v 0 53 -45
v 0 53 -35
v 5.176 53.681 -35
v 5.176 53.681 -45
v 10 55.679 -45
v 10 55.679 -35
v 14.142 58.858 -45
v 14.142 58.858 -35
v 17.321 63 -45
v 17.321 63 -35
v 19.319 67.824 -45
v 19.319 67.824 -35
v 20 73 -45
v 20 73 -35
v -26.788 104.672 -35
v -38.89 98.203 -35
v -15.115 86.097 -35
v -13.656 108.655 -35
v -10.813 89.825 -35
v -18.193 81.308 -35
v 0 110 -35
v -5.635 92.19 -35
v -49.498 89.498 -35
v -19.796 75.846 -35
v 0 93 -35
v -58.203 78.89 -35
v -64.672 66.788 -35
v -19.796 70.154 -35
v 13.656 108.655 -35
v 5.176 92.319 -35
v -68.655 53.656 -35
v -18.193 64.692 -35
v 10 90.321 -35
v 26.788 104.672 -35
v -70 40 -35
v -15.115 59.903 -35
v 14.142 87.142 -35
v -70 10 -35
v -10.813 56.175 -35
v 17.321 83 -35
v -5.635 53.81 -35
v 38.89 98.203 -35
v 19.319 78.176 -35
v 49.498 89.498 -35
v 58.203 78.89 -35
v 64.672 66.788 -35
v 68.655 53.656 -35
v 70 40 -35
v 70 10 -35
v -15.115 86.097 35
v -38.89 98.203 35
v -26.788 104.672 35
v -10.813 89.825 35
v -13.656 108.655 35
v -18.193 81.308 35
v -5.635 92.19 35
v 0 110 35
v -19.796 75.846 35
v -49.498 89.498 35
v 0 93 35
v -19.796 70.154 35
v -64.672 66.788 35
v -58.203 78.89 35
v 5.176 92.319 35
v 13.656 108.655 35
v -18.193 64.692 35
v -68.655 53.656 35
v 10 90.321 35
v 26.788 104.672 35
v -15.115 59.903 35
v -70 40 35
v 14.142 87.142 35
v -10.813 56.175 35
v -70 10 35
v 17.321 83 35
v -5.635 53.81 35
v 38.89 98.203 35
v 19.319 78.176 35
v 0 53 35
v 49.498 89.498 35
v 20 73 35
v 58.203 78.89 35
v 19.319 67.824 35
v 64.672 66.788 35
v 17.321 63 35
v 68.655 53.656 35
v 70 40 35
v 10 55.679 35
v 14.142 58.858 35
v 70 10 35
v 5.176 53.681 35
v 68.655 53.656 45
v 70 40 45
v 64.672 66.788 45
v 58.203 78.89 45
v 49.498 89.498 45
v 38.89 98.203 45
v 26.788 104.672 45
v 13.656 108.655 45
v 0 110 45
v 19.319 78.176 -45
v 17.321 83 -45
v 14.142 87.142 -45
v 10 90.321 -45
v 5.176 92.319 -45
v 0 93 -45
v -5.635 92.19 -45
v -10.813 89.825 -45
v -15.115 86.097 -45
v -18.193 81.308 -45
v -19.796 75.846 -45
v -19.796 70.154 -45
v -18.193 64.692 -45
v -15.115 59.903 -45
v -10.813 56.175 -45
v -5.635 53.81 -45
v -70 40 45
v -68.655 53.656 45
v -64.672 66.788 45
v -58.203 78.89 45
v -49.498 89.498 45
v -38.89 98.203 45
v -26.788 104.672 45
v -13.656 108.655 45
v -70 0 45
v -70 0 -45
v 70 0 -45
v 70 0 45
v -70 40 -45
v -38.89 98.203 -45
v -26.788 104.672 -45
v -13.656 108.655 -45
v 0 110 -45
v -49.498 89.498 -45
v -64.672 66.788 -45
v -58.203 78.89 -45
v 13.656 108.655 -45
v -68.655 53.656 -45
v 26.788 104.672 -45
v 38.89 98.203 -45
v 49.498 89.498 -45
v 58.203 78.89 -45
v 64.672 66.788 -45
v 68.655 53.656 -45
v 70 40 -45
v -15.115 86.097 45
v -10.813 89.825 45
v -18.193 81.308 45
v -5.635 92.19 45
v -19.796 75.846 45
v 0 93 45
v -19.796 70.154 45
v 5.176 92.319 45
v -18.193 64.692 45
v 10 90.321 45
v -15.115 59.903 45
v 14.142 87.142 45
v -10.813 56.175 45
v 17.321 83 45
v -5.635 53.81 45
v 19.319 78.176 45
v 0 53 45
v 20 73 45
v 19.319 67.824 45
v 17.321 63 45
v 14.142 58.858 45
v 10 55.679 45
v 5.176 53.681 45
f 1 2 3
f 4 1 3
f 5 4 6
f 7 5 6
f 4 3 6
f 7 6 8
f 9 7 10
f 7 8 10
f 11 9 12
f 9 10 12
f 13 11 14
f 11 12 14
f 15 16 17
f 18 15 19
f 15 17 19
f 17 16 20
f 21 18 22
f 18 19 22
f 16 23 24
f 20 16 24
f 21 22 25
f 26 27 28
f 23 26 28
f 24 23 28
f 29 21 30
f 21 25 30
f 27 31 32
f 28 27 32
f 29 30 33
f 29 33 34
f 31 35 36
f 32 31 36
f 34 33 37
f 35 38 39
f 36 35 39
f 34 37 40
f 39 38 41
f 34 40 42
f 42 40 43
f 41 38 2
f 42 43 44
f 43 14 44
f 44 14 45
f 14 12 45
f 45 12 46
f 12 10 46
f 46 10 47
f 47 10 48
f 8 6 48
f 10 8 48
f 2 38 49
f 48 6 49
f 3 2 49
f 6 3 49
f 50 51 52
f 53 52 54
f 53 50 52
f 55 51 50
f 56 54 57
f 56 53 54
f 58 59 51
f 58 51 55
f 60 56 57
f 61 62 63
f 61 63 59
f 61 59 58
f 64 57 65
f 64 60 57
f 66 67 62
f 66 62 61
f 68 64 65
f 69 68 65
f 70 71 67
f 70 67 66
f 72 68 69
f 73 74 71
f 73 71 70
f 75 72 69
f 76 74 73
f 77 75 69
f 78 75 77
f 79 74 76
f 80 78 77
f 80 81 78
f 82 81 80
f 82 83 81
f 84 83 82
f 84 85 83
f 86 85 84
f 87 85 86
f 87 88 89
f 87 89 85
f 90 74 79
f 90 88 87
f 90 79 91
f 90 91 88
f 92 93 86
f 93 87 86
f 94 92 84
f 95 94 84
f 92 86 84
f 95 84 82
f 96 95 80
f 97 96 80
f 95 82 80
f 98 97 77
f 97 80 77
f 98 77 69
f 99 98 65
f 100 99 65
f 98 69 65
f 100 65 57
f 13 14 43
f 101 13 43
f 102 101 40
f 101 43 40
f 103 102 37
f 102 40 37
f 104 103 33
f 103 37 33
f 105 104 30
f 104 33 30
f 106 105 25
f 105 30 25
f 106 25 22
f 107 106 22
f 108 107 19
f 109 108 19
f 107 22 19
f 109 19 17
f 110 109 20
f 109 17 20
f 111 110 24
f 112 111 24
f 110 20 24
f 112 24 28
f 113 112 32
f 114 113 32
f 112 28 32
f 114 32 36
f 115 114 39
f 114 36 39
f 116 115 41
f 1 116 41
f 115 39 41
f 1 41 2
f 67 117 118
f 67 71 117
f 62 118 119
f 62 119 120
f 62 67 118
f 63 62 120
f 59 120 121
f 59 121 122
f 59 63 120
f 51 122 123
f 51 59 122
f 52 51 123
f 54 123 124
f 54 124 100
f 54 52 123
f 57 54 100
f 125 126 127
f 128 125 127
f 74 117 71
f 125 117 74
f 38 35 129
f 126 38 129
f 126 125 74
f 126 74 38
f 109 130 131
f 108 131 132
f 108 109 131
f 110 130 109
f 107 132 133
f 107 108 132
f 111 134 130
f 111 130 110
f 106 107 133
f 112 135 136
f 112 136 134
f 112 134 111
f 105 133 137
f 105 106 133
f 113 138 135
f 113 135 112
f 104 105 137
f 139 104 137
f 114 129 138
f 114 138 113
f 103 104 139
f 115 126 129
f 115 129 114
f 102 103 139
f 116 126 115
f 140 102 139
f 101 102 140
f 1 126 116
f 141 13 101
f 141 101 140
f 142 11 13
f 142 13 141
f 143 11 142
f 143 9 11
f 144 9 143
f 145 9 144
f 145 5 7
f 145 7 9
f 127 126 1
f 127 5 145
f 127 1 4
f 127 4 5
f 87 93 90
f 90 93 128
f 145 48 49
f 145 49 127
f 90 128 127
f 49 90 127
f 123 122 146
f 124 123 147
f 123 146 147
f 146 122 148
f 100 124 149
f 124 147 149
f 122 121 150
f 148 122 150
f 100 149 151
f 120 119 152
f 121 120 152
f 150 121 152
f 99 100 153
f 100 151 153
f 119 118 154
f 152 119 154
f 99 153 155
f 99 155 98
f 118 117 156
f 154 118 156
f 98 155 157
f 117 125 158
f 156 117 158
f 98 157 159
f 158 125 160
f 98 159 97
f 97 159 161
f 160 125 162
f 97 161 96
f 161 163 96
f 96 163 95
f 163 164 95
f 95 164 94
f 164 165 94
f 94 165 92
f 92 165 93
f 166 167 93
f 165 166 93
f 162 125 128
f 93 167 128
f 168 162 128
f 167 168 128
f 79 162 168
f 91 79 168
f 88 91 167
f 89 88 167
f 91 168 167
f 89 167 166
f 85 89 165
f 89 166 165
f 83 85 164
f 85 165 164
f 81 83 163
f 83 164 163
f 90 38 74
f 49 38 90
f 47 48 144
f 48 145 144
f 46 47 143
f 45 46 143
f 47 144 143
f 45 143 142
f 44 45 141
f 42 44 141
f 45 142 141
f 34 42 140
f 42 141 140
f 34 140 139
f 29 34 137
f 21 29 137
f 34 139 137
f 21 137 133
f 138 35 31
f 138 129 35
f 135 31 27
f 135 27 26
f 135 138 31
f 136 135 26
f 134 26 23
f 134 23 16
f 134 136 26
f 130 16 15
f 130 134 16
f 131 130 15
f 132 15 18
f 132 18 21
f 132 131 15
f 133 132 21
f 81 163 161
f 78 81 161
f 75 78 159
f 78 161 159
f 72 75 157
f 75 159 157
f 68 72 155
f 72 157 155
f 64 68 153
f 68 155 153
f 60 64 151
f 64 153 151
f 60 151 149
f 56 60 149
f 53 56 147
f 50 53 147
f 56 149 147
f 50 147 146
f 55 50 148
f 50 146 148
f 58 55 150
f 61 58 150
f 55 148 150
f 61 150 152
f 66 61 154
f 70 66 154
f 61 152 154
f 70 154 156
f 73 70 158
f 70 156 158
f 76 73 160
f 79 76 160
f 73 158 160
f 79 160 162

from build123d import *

# Parameters (mm, degrees)
CROQUIS1_W              = 140
CROQUIS1_H              = 90
SALIENTE_EXTRUIR1_DEPTH = 10
CROQUIS2_W              = 140
CROQUIS2_H              = 10
SALIENTE_EXTRUIR2_DEPTH = 100
REDONDEO1_R             = 70
CORTAR_EXTRUIR1_DEPTH   = 100


with BuildPart() as part:
    # Croquis1 → Saliente-Extruir1 (new body)
    with BuildSketch(Plane(origin=(0, 0, 0), x_dir=(1, 0, 0), z_dir=(0, 1, 0))):
        Rectangle(CROQUIS1_W, CROQUIS1_H)
    extrude(amount=SALIENTE_EXTRUIR1_DEPTH)

    # Croquis2 → Saliente-Extruir2 (add)
    with BuildSketch(Plane(origin=(0, 10, 0), x_dir=(1, 0, 0), z_dir=(0, 1, 0))):
        with Locations((0, -40)):
            Rectangle(CROQUIS2_W, CROQUIS2_H)
        with Locations((0, 40)):
            Rectangle(CROQUIS2_W, CROQUIS2_H)
    extrude(amount=SALIENTE_EXTRUIR2_DEPTH)

    # Redondeo1
    redondeo1_edges = [part.edges().sort_by_distance(p)[0] for p in [
        (-70, 110, 40),
        (70, 110, 40),
        (70, 110, -40),
        (-70, 110, -40),
    ]]
    fillet(redondeo1_edges, radius=REDONDEO1_R - 0.0001)  # a hair under: the kernel refuses the full size

    # Croquis3 → Cortar-Extruir1 (cut)
    with BuildSketch(Plane.XY.offset(45)):
        with BuildLine():
            ThreePointArc((0, 93), (-20, 73), (0, 53))
            Line((0, 53), (0, 73))
            Line((0, 73), (0, 93))
        make_face()
        with BuildLine():
            Line((0, 73), (0, 53))
            ThreePointArc((0, 53), (14.142135624, 58.857864376), (20, 73))
            ThreePointArc((20, 73), (14.142135624, 87.142135624), (0, 93))
            Line((0, 93), (0, 73))
        make_face()
    extrude(amount=-CORTAR_EXTRUIR1_DEPTH, mode=Mode.SUBTRACT)


solid = part.part
